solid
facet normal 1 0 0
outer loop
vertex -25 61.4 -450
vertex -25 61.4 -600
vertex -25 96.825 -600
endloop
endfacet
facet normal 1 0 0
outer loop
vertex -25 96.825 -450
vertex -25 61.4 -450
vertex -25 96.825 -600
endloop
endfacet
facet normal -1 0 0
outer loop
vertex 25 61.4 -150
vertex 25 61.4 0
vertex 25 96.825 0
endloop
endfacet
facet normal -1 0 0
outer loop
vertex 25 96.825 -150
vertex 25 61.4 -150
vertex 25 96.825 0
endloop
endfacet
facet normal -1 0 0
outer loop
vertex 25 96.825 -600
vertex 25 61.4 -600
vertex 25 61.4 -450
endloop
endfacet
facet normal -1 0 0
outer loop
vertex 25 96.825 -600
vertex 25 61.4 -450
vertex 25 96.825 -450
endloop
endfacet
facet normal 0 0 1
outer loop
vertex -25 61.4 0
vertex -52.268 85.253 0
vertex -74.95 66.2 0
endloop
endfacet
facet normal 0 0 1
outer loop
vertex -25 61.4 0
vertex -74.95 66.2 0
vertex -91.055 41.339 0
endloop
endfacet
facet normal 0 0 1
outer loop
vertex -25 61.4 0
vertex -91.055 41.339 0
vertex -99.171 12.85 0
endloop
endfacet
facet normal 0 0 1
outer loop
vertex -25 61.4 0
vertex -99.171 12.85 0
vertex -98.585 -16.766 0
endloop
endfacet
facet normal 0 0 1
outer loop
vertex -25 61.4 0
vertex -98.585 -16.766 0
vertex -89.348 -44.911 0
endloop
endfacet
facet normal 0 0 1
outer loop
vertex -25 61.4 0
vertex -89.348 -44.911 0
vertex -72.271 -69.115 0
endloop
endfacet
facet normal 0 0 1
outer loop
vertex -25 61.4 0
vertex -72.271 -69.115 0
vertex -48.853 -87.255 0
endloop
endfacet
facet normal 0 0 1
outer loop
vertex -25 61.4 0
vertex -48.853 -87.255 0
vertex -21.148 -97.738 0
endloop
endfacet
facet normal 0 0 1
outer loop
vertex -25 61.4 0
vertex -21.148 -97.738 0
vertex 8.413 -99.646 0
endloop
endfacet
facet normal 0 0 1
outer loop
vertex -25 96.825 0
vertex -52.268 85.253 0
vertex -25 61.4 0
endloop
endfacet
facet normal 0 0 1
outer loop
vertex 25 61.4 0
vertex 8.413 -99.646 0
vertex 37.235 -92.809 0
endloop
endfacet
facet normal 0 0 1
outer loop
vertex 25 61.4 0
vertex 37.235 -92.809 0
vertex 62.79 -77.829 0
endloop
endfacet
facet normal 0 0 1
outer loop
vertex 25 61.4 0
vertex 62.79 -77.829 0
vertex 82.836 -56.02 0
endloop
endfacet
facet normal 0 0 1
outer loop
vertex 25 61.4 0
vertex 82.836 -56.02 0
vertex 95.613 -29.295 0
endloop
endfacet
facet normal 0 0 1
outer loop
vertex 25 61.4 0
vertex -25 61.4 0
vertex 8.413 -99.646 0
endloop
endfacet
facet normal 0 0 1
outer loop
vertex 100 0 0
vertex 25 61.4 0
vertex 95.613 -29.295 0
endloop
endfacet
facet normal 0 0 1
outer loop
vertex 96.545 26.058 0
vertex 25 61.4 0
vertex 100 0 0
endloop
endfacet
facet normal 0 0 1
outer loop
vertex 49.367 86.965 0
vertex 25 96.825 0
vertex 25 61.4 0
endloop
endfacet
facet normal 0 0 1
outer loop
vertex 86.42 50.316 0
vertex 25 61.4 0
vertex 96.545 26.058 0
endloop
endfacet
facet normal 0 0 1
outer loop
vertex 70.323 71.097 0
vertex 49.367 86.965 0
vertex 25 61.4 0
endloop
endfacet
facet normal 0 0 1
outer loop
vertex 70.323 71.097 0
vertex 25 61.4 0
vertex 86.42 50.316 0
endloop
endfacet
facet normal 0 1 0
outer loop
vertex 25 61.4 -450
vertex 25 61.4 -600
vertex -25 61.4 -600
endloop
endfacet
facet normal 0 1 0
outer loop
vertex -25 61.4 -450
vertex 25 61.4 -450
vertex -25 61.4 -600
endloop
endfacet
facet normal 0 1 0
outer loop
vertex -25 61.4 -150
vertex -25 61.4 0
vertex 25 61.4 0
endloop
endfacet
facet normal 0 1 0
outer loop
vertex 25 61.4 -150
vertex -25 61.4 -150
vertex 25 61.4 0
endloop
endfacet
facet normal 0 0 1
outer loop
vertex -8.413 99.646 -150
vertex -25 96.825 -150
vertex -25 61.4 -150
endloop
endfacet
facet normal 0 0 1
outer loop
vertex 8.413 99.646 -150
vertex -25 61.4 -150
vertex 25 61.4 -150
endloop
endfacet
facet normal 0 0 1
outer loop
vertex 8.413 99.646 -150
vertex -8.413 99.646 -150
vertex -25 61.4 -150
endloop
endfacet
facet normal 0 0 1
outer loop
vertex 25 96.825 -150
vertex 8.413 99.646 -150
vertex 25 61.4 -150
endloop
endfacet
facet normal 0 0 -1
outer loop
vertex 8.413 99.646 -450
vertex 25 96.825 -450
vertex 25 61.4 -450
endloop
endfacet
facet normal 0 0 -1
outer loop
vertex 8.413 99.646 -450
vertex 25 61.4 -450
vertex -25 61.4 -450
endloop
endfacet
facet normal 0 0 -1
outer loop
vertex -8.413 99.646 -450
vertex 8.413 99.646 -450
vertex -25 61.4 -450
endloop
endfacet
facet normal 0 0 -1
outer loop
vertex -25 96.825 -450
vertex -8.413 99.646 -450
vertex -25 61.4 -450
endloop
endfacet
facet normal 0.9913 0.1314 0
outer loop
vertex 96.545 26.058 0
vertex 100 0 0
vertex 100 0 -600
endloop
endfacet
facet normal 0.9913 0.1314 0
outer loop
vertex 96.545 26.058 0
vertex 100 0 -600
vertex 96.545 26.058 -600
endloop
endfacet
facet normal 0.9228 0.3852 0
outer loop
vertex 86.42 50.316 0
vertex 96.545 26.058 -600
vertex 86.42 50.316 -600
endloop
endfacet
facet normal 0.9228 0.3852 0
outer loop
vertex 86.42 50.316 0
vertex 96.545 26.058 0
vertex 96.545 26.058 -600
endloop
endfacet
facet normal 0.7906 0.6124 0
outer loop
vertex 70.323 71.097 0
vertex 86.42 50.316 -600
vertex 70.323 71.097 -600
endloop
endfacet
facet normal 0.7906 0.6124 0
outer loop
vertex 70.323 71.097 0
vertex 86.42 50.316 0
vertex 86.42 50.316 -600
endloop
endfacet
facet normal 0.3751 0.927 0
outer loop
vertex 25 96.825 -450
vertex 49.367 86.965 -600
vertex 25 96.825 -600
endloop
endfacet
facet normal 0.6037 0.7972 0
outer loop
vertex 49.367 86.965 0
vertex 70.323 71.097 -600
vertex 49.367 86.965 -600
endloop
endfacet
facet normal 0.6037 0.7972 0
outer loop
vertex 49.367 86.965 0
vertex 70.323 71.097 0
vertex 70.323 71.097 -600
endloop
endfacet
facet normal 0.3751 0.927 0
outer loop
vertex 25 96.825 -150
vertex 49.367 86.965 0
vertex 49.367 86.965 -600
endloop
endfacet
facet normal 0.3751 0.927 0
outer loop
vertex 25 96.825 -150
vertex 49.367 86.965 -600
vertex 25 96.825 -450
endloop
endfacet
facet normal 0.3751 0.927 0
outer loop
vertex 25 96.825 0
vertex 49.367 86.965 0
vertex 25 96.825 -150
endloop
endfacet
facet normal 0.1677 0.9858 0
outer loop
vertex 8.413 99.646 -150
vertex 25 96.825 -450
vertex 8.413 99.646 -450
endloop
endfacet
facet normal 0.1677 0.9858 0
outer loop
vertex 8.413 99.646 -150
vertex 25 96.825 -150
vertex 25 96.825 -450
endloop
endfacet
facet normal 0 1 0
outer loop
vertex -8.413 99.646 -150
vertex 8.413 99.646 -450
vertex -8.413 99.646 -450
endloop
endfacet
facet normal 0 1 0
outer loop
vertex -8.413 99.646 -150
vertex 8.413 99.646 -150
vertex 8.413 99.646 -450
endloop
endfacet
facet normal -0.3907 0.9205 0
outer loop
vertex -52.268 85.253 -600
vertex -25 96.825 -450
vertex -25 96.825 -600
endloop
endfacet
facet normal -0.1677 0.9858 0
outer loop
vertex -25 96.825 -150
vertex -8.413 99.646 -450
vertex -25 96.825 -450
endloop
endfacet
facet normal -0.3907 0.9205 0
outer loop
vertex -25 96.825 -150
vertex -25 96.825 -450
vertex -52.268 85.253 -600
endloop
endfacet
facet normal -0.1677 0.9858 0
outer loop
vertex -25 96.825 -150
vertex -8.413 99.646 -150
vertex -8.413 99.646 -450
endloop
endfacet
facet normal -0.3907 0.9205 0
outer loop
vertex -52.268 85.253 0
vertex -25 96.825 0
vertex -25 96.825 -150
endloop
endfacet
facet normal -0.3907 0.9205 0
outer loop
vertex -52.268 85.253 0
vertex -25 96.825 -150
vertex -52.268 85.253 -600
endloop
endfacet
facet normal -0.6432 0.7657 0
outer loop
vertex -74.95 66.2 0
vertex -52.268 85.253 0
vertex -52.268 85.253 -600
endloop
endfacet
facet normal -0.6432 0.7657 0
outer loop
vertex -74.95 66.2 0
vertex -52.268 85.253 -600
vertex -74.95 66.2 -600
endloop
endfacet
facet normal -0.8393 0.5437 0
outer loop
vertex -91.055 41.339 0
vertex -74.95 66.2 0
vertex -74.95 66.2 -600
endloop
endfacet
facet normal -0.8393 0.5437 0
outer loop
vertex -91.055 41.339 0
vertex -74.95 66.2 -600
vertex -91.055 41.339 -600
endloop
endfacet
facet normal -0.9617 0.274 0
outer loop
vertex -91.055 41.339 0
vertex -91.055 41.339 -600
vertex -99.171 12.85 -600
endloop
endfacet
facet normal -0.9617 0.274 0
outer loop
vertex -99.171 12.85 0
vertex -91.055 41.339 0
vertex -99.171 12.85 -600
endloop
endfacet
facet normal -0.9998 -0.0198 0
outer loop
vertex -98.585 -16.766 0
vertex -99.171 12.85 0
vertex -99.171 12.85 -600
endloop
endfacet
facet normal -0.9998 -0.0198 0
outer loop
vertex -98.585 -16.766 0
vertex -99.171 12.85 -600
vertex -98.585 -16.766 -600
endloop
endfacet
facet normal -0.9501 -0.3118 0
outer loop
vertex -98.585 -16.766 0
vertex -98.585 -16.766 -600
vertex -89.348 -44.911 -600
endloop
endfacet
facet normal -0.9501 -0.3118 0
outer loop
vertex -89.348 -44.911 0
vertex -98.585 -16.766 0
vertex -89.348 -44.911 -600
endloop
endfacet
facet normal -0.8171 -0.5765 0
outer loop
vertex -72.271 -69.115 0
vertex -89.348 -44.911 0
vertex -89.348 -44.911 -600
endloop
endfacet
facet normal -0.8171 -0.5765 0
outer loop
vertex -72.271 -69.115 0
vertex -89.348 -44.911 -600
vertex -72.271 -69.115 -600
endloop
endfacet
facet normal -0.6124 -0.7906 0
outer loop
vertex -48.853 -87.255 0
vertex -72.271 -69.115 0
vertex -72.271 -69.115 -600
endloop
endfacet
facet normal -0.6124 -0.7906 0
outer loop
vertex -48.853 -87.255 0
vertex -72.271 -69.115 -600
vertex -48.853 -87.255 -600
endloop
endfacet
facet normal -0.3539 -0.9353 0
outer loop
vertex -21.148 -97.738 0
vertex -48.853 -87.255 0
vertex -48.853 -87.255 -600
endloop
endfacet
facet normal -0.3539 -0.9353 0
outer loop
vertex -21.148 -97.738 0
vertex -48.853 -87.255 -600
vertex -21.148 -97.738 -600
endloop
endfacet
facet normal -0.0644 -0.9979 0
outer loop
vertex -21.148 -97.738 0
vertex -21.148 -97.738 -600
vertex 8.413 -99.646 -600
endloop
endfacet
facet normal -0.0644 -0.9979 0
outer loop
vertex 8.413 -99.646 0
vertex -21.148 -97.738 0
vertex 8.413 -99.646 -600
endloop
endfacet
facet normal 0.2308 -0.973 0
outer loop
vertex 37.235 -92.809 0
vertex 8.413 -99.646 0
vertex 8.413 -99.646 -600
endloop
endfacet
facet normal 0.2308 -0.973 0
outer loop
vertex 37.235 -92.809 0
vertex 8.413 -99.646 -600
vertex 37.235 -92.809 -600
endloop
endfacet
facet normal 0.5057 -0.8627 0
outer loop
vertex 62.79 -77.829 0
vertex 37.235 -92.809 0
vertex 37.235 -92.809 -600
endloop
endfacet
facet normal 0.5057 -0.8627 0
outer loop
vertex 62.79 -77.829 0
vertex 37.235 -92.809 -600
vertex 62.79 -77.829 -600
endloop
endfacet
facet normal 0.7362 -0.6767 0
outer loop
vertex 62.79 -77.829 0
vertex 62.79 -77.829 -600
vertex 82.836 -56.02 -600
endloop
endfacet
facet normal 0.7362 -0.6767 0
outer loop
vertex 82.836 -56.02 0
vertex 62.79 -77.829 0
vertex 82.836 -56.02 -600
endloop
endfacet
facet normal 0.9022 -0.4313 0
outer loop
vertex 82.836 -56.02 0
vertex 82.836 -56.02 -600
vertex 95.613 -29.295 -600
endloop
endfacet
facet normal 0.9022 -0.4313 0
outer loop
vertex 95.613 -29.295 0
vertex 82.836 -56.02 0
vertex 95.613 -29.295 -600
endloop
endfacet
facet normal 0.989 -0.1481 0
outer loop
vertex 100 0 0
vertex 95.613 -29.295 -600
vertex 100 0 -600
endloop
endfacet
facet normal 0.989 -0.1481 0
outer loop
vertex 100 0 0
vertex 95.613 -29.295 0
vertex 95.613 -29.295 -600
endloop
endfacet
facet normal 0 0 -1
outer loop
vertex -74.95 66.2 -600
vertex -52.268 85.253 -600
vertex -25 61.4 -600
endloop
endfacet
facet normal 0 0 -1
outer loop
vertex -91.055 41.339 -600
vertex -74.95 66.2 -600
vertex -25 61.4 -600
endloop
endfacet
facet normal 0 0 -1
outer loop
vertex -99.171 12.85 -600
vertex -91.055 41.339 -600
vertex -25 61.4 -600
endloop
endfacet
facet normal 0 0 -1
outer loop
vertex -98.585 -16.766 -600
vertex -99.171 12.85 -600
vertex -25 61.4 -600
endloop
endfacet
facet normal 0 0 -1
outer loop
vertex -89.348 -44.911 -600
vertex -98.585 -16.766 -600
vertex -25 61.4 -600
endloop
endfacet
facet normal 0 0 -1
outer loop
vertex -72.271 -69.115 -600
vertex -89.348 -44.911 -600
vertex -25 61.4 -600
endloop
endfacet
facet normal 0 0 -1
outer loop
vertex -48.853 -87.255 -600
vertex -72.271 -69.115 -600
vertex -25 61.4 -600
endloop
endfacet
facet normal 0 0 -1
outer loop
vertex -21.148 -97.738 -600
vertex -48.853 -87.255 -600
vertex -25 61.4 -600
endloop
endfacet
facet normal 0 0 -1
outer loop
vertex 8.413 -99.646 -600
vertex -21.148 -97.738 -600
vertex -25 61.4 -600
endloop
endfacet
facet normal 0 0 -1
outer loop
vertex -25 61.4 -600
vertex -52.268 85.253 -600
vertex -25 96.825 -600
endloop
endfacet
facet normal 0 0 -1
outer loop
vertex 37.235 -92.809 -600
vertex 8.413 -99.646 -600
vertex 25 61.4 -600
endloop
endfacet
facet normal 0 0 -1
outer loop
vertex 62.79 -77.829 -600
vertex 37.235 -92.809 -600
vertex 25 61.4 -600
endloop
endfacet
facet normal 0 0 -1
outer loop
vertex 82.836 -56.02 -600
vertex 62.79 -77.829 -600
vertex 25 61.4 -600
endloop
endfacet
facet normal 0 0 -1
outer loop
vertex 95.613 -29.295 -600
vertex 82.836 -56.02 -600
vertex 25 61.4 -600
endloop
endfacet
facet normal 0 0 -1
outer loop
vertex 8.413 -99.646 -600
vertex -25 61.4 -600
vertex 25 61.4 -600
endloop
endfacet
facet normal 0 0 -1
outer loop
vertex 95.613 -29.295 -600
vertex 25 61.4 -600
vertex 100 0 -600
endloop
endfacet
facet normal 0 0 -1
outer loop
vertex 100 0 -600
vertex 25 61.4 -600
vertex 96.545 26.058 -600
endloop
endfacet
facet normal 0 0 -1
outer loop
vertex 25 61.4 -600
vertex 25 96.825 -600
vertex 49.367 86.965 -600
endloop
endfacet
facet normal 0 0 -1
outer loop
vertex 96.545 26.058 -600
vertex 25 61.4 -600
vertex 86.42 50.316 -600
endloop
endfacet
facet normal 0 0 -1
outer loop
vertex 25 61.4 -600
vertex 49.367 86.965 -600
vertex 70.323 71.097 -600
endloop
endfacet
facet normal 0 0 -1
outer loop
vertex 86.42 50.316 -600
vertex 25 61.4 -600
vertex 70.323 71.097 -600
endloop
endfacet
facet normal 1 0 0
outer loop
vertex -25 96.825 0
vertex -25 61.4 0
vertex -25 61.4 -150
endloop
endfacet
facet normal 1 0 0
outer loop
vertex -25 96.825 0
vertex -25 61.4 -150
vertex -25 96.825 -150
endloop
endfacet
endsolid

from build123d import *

# Parameters (mm, degrees)
SKETCH1_R           = 100
BOSS_EXTRUDE1_DEPTH = 600
SKETCH2_W           = 50
SKETCH2_H           = 50
CUT_EXTRUDE1_DEPTH  = 150
SKETCH3_W           = 50
SKETCH3_H           = 50
CUT_EXTRUDE2_DEPTH  = 150


with BuildPart() as part:
    # Sketch1 → Boss-Extrude1 (new body)
    with BuildSketch(Plane.XY):
        Circle(SKETCH1_R)
    extrude(amount=-BOSS_EXTRUDE1_DEPTH)

    # Sketch2 → Cut-Extrude1 (cut)
    with BuildSketch(Plane.XY):
        with Locations((0, 86.4)):
            Rectangle(SKETCH2_W, SKETCH2_H)
    extrude(amount=-CUT_EXTRUDE1_DEPTH, mode=Mode.SUBTRACT)

    # Sketch3 → Cut-Extrude2 (cut)
    with BuildSketch(Plane(origin=(0, 0, -600), x_dir=(-1, 0, 0), z_dir=(0, 0, -1))):
        with Locations((0, 86.4)):
            Rectangle(SKETCH3_W, SKETCH3_H)
    extrude(amount=-CUT_EXTRUDE2_DEPTH, mode=Mode.SUBTRACT)


solid = part.part
